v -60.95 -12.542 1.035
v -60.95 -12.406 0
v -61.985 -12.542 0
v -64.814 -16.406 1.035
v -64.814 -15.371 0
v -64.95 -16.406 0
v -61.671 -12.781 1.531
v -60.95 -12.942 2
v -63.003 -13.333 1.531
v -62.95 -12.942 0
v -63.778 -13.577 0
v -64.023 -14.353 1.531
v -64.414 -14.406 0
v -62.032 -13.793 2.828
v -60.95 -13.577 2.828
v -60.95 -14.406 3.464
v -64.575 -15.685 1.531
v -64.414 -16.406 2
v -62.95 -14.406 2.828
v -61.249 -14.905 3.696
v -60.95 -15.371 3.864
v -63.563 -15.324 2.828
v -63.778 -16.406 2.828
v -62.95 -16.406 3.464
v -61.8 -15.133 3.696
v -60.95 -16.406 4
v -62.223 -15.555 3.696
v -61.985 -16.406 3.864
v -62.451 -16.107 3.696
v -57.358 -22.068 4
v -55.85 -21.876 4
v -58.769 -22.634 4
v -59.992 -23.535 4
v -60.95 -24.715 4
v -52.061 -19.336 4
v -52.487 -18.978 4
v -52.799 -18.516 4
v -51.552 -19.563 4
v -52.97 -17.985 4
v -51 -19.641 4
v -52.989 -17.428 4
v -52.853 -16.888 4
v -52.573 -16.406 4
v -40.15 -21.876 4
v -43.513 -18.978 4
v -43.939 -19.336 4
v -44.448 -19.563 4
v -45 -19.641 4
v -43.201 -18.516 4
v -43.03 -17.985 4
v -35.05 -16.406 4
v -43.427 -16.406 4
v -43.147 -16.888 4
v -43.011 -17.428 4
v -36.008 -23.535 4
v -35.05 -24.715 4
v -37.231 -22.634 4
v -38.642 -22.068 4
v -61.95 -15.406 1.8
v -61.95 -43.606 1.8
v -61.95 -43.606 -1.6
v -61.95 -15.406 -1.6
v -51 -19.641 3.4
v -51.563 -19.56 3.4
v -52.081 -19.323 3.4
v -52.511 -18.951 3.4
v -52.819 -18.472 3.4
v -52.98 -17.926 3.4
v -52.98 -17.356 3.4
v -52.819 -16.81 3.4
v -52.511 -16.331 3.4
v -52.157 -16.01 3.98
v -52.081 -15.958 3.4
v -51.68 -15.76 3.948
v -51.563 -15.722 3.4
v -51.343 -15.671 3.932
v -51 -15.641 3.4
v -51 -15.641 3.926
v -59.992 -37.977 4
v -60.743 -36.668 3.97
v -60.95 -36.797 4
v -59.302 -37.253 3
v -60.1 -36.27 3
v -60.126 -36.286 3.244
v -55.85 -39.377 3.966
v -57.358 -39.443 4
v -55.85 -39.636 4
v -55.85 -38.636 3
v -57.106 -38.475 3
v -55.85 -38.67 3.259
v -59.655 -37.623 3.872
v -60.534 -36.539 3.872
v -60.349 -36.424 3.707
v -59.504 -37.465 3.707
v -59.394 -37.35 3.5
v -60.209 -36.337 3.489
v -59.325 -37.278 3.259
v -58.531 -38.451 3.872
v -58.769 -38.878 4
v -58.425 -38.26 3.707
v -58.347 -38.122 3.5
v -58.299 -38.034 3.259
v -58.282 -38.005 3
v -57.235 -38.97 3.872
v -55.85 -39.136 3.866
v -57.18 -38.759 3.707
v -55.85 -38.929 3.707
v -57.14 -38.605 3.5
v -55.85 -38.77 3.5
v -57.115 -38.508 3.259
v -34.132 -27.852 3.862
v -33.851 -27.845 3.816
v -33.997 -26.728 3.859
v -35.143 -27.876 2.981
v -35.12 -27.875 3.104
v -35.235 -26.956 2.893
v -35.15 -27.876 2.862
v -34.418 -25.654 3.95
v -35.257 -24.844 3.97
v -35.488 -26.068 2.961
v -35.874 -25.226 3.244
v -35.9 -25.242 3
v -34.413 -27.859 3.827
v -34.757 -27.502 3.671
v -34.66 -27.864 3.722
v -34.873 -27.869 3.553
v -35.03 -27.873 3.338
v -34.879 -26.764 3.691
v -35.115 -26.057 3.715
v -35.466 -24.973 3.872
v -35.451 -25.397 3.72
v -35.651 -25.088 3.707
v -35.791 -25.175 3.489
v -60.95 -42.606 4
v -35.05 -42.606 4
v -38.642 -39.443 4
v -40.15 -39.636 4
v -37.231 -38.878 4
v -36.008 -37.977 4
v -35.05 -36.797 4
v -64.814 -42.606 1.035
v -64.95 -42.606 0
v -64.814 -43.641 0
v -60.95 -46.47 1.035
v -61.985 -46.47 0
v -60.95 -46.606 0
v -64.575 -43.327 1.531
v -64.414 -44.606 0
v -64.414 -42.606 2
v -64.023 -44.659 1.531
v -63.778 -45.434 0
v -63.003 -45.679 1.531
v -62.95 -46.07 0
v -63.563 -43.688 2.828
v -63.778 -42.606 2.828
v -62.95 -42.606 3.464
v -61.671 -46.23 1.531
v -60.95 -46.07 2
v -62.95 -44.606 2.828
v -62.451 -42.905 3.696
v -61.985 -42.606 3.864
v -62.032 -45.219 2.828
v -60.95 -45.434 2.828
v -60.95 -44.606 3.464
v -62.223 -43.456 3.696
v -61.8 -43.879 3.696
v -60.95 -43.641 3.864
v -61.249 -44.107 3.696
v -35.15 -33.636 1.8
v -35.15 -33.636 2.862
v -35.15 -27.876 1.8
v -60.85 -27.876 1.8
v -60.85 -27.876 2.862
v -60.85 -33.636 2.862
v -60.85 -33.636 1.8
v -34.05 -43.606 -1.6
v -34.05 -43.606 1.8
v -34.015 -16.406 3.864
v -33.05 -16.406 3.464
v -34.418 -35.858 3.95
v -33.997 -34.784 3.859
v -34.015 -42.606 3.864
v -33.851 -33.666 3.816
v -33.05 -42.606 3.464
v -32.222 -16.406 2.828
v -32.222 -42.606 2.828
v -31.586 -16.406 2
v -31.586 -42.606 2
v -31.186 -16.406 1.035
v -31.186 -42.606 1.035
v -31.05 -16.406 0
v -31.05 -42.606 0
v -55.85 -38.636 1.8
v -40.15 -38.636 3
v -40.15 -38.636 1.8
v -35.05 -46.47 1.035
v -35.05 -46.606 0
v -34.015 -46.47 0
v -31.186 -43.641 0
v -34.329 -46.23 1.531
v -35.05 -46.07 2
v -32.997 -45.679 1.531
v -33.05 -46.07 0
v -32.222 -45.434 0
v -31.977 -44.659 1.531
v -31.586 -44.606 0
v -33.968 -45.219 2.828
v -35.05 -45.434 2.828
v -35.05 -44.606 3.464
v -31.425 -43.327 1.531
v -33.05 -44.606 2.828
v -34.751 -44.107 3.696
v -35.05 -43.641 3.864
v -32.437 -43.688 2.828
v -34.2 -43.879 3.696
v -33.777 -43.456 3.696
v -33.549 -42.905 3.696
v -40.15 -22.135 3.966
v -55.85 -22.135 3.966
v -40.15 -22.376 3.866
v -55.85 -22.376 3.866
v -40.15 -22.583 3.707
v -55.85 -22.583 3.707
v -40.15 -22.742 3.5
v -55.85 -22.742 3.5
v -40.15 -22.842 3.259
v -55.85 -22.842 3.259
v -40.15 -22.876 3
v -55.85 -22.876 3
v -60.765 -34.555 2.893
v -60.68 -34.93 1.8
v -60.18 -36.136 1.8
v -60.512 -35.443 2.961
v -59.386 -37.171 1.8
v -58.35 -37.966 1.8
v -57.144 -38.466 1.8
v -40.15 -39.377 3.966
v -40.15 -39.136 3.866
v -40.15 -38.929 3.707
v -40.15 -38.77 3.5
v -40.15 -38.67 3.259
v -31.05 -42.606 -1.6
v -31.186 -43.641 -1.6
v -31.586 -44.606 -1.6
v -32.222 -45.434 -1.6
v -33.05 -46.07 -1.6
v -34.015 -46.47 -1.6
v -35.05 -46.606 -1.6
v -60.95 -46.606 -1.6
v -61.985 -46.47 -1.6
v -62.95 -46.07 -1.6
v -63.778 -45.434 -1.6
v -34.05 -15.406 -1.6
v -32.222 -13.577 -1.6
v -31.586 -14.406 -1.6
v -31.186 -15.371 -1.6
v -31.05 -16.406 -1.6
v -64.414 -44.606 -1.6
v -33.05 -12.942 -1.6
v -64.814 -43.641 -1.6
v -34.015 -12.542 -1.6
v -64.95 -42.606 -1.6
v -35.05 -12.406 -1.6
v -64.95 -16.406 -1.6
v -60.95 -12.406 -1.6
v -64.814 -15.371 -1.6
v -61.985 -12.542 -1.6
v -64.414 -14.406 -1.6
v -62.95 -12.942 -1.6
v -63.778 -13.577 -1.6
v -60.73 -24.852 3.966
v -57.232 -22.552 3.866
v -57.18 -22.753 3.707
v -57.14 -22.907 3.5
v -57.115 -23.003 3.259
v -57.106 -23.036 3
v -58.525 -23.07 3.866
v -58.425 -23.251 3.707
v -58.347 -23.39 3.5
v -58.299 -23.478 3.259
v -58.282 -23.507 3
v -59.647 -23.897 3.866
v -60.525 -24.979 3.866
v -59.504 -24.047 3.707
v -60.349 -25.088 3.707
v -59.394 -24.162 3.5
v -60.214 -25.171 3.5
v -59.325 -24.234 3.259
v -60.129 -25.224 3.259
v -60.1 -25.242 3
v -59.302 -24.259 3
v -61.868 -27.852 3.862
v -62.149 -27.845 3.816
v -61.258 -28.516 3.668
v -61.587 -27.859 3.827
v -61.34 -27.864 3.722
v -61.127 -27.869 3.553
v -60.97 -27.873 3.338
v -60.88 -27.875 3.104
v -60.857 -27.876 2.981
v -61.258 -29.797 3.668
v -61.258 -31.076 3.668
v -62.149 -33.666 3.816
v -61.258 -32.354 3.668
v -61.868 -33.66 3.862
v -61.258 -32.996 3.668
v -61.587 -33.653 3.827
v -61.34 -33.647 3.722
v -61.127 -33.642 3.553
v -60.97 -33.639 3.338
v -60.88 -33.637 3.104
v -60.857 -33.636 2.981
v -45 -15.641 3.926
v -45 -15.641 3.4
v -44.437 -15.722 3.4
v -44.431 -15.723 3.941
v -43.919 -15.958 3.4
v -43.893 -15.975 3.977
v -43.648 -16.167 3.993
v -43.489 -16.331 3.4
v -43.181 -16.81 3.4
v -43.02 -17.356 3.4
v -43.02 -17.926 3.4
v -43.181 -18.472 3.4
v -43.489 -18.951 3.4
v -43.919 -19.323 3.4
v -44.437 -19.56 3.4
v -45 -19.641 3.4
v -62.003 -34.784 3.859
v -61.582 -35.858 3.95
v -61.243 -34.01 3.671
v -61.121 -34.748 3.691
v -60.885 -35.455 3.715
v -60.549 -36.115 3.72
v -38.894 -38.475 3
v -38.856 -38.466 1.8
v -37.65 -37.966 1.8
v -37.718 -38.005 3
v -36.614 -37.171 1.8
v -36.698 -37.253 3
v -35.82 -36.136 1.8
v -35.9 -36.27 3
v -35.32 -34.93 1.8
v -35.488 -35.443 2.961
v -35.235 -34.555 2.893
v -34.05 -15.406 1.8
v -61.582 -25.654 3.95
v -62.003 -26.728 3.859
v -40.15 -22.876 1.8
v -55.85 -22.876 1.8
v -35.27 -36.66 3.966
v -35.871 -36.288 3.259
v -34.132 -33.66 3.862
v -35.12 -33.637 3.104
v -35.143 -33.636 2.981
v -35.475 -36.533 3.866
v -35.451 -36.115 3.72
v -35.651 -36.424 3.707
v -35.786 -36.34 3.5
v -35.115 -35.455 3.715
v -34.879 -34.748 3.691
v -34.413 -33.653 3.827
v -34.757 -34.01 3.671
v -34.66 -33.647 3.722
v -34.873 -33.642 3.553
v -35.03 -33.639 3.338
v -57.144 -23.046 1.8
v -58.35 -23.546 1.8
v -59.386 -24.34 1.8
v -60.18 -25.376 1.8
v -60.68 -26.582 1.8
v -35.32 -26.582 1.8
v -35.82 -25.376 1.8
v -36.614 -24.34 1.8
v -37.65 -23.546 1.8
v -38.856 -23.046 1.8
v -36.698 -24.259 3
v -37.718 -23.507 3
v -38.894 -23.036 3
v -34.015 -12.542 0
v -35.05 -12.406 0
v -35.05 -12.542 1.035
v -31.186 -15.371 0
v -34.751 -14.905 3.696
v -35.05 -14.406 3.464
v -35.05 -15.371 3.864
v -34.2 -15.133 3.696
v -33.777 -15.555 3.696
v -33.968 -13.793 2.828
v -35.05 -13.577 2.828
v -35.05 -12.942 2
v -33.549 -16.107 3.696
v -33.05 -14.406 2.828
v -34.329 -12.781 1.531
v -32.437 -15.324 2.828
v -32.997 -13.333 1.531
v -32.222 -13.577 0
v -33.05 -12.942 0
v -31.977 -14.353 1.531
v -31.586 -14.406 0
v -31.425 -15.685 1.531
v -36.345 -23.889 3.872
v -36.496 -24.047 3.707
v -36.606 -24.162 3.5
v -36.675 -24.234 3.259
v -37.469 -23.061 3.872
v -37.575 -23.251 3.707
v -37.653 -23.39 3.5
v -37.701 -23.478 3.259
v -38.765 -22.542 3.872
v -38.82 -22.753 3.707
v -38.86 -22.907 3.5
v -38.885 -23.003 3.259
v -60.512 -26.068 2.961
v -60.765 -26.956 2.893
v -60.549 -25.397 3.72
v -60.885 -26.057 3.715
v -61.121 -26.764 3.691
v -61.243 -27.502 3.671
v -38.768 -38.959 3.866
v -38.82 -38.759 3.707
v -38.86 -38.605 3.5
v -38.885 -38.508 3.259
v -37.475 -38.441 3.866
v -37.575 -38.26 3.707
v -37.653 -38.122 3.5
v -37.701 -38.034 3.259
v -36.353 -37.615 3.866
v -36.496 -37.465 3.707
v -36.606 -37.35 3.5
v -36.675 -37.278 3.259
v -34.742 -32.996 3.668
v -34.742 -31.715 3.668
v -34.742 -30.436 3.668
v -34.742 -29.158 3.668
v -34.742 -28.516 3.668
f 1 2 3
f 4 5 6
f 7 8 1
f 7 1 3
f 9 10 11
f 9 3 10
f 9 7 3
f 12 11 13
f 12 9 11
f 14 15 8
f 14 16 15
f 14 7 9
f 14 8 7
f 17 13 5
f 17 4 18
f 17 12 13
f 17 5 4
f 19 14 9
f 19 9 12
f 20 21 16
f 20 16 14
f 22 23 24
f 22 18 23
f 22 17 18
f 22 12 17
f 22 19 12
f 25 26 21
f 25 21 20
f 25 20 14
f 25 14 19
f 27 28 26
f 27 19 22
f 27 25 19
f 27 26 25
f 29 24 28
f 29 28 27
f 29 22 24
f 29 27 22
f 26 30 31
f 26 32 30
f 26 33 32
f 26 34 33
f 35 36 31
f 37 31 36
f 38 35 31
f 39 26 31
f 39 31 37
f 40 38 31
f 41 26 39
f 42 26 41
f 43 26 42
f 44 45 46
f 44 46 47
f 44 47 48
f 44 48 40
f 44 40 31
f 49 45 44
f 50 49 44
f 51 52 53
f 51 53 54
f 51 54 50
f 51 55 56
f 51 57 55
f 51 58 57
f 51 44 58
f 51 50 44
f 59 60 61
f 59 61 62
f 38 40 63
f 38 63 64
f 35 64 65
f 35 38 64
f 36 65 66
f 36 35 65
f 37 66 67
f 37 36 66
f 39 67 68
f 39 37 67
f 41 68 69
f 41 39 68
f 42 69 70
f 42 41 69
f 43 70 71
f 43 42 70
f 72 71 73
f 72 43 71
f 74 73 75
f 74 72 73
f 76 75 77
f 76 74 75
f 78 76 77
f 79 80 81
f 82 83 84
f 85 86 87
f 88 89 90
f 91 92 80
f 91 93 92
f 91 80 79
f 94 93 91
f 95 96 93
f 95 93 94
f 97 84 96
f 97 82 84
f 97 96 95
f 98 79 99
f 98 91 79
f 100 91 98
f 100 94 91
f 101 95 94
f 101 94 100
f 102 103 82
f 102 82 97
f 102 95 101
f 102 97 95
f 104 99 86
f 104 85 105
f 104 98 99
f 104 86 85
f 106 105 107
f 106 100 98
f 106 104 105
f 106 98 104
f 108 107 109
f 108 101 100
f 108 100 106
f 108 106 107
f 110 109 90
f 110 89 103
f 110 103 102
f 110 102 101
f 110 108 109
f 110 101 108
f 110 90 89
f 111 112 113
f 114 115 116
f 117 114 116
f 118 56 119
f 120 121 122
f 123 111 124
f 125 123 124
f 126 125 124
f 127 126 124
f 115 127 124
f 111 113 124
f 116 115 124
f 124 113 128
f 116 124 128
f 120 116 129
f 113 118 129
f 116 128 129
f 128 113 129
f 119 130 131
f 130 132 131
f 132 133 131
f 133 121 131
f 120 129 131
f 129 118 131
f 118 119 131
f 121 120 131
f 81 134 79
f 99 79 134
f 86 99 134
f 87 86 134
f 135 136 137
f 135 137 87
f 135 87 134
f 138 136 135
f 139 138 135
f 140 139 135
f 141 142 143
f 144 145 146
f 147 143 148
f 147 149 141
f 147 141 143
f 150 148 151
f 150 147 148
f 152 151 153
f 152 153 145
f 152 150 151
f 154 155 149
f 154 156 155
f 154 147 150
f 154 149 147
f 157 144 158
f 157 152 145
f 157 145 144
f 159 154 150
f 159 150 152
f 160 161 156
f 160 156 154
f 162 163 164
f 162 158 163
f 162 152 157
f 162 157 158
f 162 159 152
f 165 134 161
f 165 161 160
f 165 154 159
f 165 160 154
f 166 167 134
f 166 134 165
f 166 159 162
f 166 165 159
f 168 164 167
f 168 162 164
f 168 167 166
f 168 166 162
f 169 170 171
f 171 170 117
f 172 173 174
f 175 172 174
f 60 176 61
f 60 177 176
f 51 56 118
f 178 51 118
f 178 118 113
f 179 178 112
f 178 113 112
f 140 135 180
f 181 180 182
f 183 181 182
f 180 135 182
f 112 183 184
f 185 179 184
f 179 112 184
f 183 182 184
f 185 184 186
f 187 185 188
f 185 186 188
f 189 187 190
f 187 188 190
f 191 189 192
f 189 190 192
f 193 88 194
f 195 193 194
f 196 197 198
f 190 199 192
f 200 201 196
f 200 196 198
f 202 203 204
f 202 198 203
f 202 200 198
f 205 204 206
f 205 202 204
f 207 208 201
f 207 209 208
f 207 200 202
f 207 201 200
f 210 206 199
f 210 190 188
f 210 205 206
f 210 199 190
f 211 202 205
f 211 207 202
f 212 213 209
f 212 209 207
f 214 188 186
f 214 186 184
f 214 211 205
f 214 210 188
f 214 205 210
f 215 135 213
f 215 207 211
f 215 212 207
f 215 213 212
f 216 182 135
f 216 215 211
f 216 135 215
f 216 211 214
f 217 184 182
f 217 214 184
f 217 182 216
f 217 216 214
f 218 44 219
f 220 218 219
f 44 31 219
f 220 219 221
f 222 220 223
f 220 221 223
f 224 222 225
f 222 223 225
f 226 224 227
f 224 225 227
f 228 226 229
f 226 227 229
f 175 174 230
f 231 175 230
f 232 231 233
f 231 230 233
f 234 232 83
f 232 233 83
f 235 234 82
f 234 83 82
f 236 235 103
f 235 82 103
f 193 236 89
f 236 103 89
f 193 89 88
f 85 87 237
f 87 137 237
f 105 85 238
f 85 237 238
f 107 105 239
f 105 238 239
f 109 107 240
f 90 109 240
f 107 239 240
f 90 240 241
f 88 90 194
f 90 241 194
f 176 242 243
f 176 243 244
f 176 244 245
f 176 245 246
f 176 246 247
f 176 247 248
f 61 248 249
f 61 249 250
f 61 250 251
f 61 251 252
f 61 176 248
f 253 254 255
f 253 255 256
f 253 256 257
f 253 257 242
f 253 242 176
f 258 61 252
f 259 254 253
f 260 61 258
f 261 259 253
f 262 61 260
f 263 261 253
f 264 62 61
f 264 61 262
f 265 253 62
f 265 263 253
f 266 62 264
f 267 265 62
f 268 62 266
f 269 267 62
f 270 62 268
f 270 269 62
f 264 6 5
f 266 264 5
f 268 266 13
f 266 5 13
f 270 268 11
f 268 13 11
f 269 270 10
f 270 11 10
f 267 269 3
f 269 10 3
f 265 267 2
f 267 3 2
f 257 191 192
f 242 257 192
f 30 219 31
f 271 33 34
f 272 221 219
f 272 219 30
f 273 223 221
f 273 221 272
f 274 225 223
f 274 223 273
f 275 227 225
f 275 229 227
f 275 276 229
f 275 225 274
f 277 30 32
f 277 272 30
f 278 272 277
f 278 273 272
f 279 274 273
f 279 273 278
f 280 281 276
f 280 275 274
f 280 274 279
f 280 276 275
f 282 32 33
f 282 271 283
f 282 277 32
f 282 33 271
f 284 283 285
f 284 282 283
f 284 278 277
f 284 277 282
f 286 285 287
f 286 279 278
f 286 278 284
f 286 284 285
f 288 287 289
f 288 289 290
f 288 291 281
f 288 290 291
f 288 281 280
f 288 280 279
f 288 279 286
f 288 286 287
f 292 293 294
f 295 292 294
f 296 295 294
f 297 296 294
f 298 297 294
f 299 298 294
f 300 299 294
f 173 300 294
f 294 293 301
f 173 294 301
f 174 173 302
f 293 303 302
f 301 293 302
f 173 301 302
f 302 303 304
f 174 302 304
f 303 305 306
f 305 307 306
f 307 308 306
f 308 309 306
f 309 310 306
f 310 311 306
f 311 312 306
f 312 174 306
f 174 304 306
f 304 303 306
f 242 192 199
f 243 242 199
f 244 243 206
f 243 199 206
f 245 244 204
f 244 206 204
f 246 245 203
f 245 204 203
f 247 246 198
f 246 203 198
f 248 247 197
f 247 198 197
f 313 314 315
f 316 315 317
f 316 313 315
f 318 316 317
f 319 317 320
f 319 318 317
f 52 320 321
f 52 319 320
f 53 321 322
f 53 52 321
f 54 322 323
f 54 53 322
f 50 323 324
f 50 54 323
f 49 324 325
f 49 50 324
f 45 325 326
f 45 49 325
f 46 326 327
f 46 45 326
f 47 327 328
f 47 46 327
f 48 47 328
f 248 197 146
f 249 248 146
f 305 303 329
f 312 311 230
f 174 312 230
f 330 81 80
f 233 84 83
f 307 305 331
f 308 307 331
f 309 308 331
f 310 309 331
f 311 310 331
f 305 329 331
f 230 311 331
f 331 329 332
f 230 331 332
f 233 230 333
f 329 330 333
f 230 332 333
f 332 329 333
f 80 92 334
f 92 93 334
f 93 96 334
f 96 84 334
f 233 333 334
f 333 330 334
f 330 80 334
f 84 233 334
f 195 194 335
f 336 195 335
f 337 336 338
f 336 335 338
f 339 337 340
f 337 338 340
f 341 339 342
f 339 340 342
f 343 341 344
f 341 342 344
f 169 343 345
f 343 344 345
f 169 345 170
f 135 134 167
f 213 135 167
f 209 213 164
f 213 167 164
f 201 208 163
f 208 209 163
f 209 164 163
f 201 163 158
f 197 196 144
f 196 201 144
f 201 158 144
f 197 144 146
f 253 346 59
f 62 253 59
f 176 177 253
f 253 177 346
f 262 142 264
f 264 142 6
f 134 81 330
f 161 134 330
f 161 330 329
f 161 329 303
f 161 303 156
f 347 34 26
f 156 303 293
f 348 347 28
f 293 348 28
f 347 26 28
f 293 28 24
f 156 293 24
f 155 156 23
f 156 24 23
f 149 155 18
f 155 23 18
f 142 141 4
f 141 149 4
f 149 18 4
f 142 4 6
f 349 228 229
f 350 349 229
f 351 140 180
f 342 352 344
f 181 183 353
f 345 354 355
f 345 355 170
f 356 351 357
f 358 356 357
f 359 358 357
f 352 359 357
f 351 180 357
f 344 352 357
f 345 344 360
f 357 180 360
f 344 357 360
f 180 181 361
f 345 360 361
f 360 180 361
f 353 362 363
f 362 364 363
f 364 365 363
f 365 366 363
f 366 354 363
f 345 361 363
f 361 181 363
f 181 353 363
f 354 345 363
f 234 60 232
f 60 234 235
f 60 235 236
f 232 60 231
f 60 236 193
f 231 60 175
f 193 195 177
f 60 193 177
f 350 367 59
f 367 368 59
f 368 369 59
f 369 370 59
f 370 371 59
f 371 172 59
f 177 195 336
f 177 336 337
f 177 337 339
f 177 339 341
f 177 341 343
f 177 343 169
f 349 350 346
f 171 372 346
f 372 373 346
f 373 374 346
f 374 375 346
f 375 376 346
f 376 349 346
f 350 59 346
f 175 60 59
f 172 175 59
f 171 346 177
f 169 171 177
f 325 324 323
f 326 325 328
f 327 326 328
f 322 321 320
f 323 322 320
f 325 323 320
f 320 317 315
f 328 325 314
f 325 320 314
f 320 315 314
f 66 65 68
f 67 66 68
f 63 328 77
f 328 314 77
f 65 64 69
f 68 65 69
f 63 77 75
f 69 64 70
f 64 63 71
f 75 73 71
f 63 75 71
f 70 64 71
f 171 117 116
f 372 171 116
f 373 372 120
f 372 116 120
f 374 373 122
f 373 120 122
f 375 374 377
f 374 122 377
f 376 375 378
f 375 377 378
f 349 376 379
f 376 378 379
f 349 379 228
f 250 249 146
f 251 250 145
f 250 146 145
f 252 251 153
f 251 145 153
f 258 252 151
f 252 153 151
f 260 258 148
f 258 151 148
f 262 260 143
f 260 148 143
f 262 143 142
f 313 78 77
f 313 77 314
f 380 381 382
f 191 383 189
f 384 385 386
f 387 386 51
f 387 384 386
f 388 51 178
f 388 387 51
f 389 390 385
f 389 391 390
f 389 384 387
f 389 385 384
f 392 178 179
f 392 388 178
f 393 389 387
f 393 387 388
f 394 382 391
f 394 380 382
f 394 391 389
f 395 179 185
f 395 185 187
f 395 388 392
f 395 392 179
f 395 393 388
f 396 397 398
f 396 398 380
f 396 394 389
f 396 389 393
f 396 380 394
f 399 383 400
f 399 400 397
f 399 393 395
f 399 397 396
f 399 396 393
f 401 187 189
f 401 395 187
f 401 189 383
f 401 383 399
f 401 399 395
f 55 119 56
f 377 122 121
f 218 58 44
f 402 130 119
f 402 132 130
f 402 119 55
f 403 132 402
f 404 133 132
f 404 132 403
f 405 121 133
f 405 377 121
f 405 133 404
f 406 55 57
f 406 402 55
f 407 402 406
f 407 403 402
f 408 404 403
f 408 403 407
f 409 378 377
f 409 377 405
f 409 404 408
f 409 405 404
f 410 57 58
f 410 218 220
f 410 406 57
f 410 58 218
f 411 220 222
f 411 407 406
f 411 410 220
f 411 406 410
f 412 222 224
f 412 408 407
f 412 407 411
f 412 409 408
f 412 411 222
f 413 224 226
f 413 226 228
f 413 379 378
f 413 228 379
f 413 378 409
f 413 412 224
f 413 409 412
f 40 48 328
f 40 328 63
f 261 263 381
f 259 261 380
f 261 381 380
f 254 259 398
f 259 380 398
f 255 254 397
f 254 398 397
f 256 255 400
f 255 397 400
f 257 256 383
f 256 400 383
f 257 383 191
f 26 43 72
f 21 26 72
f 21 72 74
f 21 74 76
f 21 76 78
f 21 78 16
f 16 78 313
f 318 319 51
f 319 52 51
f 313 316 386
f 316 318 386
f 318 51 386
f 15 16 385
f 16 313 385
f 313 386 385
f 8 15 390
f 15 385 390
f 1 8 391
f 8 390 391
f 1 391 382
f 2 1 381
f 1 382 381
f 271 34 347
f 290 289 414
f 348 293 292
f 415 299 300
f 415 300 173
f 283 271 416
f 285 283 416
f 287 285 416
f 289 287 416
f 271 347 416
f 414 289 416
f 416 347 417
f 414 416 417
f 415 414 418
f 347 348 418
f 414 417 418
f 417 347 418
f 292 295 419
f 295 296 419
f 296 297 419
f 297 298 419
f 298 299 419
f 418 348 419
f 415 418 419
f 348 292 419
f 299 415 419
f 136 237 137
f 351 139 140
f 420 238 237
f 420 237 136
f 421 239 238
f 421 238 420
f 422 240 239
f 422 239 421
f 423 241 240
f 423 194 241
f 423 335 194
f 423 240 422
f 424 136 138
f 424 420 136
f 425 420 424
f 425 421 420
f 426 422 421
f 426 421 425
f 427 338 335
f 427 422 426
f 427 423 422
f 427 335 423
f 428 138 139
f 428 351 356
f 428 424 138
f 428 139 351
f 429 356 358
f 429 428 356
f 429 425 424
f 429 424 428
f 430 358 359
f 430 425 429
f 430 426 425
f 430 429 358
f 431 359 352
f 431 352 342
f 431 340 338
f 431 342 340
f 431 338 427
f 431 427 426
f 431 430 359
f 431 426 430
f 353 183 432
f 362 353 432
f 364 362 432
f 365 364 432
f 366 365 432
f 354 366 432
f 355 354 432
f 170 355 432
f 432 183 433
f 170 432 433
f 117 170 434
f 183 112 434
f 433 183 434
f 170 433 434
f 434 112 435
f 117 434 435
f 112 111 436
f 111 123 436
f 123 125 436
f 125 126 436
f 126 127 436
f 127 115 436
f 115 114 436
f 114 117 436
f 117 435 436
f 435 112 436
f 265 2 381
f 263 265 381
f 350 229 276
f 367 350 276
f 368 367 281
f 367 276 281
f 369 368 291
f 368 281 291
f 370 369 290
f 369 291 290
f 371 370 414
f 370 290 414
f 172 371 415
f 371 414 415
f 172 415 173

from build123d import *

# Parameters (mm, degrees)
SKETCH_1_W          = 33.9
SKETCH_1_H          = 34.2
SKETCH_1_W_2        = 27.9
SKETCH_1_H_2        = 28.2
EXTRUDE_1_DEPTH     = 4
SKETCH_2_W          = 33.9
SKETCH_2_H          = 34.2
EXTRUDE_2_DEPTH     = 2.2
FILLET_1_R          = 4
CUT_EXTRUDE_1_DEPTH = 0.6
FILLET_2_R          = 4
SKETCH_4_W          = 27.9
SKETCH_4_H          = 28.2
EXTRUDE_3_DEPTH     = 1.6
FILLET_3_R          = 1


with BuildPart() as part:
    # Эскиз1 → Бобышка-Вытянуть1 (new body)
    with BuildSketch(Plane.XY):
        with Locations((-48, -29.505896468)):
            Rectangle(SKETCH_1_W, SKETCH_1_H)
        with Locations((-48, -29.505896468)):
            Rectangle(SKETCH_1_W_2, SKETCH_1_H_2, mode=Mode.SUBTRACT)
    extrude(amount=EXTRUDE_1_DEPTH)

    # Эскиз2 → Бобышка-Вытянуть2 (add)
    with BuildSketch(Plane.XY.offset(4)):
        with Locations((-48, -29.505896468)):
            Rectangle(SKETCH_2_W, SKETCH_2_H)
        with BuildLine():
            Line((-60.85, -27.875896468), (-60.85, -33.635896468))
            ThreePointArc((-60.85, -33.635896468), (-59.385533906, -37.171430374), (-55.85, -38.635896468))
            Line((-55.85, -38.635896468), (-40.15, -38.635896468))
            ThreePointArc((-40.15, -38.635896468), (-36.614466094, -37.171430374), (-35.15, -33.635896468))
            Line((-35.15, -33.635896468), (-35.15, -27.875896468))
            ThreePointArc((-35.15, -27.875896468), (-36.614466094, -24.340362562), (-40.15, -22.875896468))
            Line((-40.15, -22.875896468), (-55.85, -22.875896468))
            ThreePointArc((-55.85, -22.875896468), (-59.385533906, -24.340362562), (-60.85, -27.875896468))
        make_face(mode=Mode.SUBTRACT)
    extrude(amount=-EXTRUDE_2_DEPTH)

    # Скругление1
    fillet_1_edges = [part.edges().sort_by_distance(p)[0] for p in [
        (-31.05, -46.605896468, 2),
        (-64.95, -46.605896468, 2),
        (-64.95, -12.405896468, 2),
        (-31.05, -12.405896468, 2),
    ]]
    fillet(fillet_1_edges, radius=FILLET_1_R)

    # Эскиз3 → Вырез-Вытянуть1 (cut)
    with BuildSketch(Plane.XY.offset(4)):
        with BuildLine():
            Line((-45, -19.640896468), (-51, -19.640896468))
            ThreePointArc((-51, -19.640896468), (-53, -17.640896468), (-51, -15.640896468))
            Line((-51, -15.640896468), (-45, -15.640896468))
            ThreePointArc((-45, -15.640896468), (-43, -17.640896468), (-45, -19.640896468))
        make_face()
    extrude(amount=-CUT_EXTRUDE_1_DEPTH, mode=Mode.SUBTRACT)

    # Скругление2
    # the kernel refuses this fillet: 4 mm, written as the material it takes off along each edge
    with BuildSketch(Plane(origin=(-35.05, -42.605896468, 4), x_dir=(0, -1, 0), z_dir=(-1, 0, 0))) as fillet_2_piece_1:
        with BuildLine():
            CenterArc((4 - FILLET_2_R, -FILLET_2_R), FILLET_2_R, 0, 90)
            Line((4, -FILLET_2_R), (4, 0))
            Line((4, 0), (4 - FILLET_2_R, 0))
        make_face()
    revolve(axis=Axis((-35.05, -42.605896468, 4), (0, 0, 1)), revolution_arc=90, mode=Mode.SUBTRACT)
    with BuildSketch(Plane(origin=(-60.95, -46.605896468, 4), x_dir=(0, 1, 0), z_dir=(1, 0, 0))) as fillet_2_piece_2:
        with BuildLine():
            CenterArc((FILLET_2_R, -FILLET_2_R), FILLET_2_R, 90, 90)
            Line((0, -FILLET_2_R), (0, 0))
            Line((0, 0), (FILLET_2_R, 0))
        make_face()
    extrude(amount=25.9, mode=Mode.SUBTRACT)
    with BuildSketch(Plane(origin=(-60.95, -42.605896468, 4), x_dir=(-1, 0, 0), z_dir=(0, 1, 0))) as fillet_2_piece_3:
        with BuildLine():
            CenterArc((4 - FILLET_2_R, -FILLET_2_R), FILLET_2_R, 0, 90)
            Line((4, -FILLET_2_R), (4, 0))
            Line((4, 0), (4 - FILLET_2_R, 0))
        make_face()
    revolve(axis=Axis((-60.95, -42.605896468, 4), (0, 0, 1)), revolution_arc=90, mode=Mode.SUBTRACT)
    with BuildSketch(Plane(origin=(-64.95, -16.405896468, 4), x_dir=(1, 0, 0), z_dir=(0, -1, 0)), Plane(origin=(-31.05, -42.605896468, 4), x_dir=(-1, 0, 0), z_dir=(0, 1, 0))) as fillet_2_piece_4:
        with BuildLine():
            CenterArc((FILLET_2_R, -FILLET_2_R), FILLET_2_R, 90, 90)
            Line((0, -FILLET_2_R), (0, 0))
            Line((0, 0), (FILLET_2_R, 0))
        make_face()
    extrude(amount=26.2, mode=Mode.SUBTRACT)
    with BuildSketch(Plane(origin=(-60.95, -16.405896468, 4), x_dir=(0, 1, 0), z_dir=(1, 0, 0))) as fillet_2_piece_5:
        with BuildLine():
            CenterArc((4 - FILLET_2_R, -FILLET_2_R), FILLET_2_R, 0, 90)
            Line((4 - FILLET_2_R, 0), (4, 0))
            Line((4, 0), (4, -FILLET_2_R))
        make_face()
    revolve(axis=Axis((-60.95, -16.405896468, 4), (0, 0, 1)), revolution_arc=90, mode=Mode.SUBTRACT)
    with BuildSketch(Plane(origin=(-35.05, -12.405896468, 4), x_dir=(0, 0, -1), z_dir=(-1, 0, 0))) as fillet_2_piece_6:
        with BuildLine():
            CenterArc((FILLET_2_R, FILLET_2_R), FILLET_2_R, 180, 90)
            Line((0, FILLET_2_R), (0, 0))
            Line((0, 0), (FILLET_2_R, 0))
        make_face()
    extrude(amount=25.9, mode=Mode.SUBTRACT)
    with BuildSketch(Plane(origin=(-35.05, -16.405896468, 4), x_dir=(0, 1, 0), z_dir=(-1, 0, 0))) as fillet_2_piece_7:
        with BuildLine():
            CenterArc((4 - FILLET_2_R, FILLET_2_R), FILLET_2_R, 270, 90)
            Line((4 - FILLET_2_R, 0), (4, 0))
            Line((4, 0), (4, FILLET_2_R))
        make_face()
    revolve(axis=Axis((-35.05, -16.405896468, 4), (0, 0, -1)), revolution_arc=90, mode=Mode.SUBTRACT)

    # Эскиз4 → Бобышка-Вытянуть3 (add)
    with BuildSketch(Plane(origin=(0, 0, 0), x_dir=(-1, 0, 0), z_dir=(0, 0, -1))):
        with BuildLine():
            Line((60.95, -12.405896468), (35.05, -12.405896468))
            ThreePointArc((35.05, -12.405896468), (32.221572875, -13.577469343), (31.05, -16.405896468))
            Line((31.05, -16.405896468), (31.05, -42.605896468))
            ThreePointArc((31.05, -42.605896468), (32.221572875, -45.434323593), (35.05, -46.605896468))
            Line((35.05, -46.605896468), (60.95, -46.605896468))
            ThreePointArc((60.95, -46.605896468), (63.778427125, -45.434323593), (64.95, -42.605896468))
            Line((64.95, -42.605896468), (64.95, -16.405896468))
            ThreePointArc((64.95, -16.405896468), (63.778427125, -13.577469343), (60.95, -12.405896468))
        make_face()
        with Locations((48, -29.505896468)):
            Rectangle(SKETCH_4_W, SKETCH_4_H, mode=Mode.SUBTRACT)
    extrude(amount=EXTRUDE_3_DEPTH)

    # Скругление3
    fillet_3_edges = [part.edges().sort_by_distance(p)[0] for p in [
        (-48, -38.635896468, 4),
        (-36.614466094, -37.171430374, 4),
        (-35.15, -30.755896468, 4),
        (-36.614466094, -24.340362562, 4),
        (-48, -22.875896468, 4),
        (-59.385533906, -24.340362562, 4),
        (-60.85, -30.755896468, 4),
        (-59.385533906, -37.171430374, 4),
    ]]
    fillet(fillet_3_edges, radius=FILLET_3_R)


solid = part.part
